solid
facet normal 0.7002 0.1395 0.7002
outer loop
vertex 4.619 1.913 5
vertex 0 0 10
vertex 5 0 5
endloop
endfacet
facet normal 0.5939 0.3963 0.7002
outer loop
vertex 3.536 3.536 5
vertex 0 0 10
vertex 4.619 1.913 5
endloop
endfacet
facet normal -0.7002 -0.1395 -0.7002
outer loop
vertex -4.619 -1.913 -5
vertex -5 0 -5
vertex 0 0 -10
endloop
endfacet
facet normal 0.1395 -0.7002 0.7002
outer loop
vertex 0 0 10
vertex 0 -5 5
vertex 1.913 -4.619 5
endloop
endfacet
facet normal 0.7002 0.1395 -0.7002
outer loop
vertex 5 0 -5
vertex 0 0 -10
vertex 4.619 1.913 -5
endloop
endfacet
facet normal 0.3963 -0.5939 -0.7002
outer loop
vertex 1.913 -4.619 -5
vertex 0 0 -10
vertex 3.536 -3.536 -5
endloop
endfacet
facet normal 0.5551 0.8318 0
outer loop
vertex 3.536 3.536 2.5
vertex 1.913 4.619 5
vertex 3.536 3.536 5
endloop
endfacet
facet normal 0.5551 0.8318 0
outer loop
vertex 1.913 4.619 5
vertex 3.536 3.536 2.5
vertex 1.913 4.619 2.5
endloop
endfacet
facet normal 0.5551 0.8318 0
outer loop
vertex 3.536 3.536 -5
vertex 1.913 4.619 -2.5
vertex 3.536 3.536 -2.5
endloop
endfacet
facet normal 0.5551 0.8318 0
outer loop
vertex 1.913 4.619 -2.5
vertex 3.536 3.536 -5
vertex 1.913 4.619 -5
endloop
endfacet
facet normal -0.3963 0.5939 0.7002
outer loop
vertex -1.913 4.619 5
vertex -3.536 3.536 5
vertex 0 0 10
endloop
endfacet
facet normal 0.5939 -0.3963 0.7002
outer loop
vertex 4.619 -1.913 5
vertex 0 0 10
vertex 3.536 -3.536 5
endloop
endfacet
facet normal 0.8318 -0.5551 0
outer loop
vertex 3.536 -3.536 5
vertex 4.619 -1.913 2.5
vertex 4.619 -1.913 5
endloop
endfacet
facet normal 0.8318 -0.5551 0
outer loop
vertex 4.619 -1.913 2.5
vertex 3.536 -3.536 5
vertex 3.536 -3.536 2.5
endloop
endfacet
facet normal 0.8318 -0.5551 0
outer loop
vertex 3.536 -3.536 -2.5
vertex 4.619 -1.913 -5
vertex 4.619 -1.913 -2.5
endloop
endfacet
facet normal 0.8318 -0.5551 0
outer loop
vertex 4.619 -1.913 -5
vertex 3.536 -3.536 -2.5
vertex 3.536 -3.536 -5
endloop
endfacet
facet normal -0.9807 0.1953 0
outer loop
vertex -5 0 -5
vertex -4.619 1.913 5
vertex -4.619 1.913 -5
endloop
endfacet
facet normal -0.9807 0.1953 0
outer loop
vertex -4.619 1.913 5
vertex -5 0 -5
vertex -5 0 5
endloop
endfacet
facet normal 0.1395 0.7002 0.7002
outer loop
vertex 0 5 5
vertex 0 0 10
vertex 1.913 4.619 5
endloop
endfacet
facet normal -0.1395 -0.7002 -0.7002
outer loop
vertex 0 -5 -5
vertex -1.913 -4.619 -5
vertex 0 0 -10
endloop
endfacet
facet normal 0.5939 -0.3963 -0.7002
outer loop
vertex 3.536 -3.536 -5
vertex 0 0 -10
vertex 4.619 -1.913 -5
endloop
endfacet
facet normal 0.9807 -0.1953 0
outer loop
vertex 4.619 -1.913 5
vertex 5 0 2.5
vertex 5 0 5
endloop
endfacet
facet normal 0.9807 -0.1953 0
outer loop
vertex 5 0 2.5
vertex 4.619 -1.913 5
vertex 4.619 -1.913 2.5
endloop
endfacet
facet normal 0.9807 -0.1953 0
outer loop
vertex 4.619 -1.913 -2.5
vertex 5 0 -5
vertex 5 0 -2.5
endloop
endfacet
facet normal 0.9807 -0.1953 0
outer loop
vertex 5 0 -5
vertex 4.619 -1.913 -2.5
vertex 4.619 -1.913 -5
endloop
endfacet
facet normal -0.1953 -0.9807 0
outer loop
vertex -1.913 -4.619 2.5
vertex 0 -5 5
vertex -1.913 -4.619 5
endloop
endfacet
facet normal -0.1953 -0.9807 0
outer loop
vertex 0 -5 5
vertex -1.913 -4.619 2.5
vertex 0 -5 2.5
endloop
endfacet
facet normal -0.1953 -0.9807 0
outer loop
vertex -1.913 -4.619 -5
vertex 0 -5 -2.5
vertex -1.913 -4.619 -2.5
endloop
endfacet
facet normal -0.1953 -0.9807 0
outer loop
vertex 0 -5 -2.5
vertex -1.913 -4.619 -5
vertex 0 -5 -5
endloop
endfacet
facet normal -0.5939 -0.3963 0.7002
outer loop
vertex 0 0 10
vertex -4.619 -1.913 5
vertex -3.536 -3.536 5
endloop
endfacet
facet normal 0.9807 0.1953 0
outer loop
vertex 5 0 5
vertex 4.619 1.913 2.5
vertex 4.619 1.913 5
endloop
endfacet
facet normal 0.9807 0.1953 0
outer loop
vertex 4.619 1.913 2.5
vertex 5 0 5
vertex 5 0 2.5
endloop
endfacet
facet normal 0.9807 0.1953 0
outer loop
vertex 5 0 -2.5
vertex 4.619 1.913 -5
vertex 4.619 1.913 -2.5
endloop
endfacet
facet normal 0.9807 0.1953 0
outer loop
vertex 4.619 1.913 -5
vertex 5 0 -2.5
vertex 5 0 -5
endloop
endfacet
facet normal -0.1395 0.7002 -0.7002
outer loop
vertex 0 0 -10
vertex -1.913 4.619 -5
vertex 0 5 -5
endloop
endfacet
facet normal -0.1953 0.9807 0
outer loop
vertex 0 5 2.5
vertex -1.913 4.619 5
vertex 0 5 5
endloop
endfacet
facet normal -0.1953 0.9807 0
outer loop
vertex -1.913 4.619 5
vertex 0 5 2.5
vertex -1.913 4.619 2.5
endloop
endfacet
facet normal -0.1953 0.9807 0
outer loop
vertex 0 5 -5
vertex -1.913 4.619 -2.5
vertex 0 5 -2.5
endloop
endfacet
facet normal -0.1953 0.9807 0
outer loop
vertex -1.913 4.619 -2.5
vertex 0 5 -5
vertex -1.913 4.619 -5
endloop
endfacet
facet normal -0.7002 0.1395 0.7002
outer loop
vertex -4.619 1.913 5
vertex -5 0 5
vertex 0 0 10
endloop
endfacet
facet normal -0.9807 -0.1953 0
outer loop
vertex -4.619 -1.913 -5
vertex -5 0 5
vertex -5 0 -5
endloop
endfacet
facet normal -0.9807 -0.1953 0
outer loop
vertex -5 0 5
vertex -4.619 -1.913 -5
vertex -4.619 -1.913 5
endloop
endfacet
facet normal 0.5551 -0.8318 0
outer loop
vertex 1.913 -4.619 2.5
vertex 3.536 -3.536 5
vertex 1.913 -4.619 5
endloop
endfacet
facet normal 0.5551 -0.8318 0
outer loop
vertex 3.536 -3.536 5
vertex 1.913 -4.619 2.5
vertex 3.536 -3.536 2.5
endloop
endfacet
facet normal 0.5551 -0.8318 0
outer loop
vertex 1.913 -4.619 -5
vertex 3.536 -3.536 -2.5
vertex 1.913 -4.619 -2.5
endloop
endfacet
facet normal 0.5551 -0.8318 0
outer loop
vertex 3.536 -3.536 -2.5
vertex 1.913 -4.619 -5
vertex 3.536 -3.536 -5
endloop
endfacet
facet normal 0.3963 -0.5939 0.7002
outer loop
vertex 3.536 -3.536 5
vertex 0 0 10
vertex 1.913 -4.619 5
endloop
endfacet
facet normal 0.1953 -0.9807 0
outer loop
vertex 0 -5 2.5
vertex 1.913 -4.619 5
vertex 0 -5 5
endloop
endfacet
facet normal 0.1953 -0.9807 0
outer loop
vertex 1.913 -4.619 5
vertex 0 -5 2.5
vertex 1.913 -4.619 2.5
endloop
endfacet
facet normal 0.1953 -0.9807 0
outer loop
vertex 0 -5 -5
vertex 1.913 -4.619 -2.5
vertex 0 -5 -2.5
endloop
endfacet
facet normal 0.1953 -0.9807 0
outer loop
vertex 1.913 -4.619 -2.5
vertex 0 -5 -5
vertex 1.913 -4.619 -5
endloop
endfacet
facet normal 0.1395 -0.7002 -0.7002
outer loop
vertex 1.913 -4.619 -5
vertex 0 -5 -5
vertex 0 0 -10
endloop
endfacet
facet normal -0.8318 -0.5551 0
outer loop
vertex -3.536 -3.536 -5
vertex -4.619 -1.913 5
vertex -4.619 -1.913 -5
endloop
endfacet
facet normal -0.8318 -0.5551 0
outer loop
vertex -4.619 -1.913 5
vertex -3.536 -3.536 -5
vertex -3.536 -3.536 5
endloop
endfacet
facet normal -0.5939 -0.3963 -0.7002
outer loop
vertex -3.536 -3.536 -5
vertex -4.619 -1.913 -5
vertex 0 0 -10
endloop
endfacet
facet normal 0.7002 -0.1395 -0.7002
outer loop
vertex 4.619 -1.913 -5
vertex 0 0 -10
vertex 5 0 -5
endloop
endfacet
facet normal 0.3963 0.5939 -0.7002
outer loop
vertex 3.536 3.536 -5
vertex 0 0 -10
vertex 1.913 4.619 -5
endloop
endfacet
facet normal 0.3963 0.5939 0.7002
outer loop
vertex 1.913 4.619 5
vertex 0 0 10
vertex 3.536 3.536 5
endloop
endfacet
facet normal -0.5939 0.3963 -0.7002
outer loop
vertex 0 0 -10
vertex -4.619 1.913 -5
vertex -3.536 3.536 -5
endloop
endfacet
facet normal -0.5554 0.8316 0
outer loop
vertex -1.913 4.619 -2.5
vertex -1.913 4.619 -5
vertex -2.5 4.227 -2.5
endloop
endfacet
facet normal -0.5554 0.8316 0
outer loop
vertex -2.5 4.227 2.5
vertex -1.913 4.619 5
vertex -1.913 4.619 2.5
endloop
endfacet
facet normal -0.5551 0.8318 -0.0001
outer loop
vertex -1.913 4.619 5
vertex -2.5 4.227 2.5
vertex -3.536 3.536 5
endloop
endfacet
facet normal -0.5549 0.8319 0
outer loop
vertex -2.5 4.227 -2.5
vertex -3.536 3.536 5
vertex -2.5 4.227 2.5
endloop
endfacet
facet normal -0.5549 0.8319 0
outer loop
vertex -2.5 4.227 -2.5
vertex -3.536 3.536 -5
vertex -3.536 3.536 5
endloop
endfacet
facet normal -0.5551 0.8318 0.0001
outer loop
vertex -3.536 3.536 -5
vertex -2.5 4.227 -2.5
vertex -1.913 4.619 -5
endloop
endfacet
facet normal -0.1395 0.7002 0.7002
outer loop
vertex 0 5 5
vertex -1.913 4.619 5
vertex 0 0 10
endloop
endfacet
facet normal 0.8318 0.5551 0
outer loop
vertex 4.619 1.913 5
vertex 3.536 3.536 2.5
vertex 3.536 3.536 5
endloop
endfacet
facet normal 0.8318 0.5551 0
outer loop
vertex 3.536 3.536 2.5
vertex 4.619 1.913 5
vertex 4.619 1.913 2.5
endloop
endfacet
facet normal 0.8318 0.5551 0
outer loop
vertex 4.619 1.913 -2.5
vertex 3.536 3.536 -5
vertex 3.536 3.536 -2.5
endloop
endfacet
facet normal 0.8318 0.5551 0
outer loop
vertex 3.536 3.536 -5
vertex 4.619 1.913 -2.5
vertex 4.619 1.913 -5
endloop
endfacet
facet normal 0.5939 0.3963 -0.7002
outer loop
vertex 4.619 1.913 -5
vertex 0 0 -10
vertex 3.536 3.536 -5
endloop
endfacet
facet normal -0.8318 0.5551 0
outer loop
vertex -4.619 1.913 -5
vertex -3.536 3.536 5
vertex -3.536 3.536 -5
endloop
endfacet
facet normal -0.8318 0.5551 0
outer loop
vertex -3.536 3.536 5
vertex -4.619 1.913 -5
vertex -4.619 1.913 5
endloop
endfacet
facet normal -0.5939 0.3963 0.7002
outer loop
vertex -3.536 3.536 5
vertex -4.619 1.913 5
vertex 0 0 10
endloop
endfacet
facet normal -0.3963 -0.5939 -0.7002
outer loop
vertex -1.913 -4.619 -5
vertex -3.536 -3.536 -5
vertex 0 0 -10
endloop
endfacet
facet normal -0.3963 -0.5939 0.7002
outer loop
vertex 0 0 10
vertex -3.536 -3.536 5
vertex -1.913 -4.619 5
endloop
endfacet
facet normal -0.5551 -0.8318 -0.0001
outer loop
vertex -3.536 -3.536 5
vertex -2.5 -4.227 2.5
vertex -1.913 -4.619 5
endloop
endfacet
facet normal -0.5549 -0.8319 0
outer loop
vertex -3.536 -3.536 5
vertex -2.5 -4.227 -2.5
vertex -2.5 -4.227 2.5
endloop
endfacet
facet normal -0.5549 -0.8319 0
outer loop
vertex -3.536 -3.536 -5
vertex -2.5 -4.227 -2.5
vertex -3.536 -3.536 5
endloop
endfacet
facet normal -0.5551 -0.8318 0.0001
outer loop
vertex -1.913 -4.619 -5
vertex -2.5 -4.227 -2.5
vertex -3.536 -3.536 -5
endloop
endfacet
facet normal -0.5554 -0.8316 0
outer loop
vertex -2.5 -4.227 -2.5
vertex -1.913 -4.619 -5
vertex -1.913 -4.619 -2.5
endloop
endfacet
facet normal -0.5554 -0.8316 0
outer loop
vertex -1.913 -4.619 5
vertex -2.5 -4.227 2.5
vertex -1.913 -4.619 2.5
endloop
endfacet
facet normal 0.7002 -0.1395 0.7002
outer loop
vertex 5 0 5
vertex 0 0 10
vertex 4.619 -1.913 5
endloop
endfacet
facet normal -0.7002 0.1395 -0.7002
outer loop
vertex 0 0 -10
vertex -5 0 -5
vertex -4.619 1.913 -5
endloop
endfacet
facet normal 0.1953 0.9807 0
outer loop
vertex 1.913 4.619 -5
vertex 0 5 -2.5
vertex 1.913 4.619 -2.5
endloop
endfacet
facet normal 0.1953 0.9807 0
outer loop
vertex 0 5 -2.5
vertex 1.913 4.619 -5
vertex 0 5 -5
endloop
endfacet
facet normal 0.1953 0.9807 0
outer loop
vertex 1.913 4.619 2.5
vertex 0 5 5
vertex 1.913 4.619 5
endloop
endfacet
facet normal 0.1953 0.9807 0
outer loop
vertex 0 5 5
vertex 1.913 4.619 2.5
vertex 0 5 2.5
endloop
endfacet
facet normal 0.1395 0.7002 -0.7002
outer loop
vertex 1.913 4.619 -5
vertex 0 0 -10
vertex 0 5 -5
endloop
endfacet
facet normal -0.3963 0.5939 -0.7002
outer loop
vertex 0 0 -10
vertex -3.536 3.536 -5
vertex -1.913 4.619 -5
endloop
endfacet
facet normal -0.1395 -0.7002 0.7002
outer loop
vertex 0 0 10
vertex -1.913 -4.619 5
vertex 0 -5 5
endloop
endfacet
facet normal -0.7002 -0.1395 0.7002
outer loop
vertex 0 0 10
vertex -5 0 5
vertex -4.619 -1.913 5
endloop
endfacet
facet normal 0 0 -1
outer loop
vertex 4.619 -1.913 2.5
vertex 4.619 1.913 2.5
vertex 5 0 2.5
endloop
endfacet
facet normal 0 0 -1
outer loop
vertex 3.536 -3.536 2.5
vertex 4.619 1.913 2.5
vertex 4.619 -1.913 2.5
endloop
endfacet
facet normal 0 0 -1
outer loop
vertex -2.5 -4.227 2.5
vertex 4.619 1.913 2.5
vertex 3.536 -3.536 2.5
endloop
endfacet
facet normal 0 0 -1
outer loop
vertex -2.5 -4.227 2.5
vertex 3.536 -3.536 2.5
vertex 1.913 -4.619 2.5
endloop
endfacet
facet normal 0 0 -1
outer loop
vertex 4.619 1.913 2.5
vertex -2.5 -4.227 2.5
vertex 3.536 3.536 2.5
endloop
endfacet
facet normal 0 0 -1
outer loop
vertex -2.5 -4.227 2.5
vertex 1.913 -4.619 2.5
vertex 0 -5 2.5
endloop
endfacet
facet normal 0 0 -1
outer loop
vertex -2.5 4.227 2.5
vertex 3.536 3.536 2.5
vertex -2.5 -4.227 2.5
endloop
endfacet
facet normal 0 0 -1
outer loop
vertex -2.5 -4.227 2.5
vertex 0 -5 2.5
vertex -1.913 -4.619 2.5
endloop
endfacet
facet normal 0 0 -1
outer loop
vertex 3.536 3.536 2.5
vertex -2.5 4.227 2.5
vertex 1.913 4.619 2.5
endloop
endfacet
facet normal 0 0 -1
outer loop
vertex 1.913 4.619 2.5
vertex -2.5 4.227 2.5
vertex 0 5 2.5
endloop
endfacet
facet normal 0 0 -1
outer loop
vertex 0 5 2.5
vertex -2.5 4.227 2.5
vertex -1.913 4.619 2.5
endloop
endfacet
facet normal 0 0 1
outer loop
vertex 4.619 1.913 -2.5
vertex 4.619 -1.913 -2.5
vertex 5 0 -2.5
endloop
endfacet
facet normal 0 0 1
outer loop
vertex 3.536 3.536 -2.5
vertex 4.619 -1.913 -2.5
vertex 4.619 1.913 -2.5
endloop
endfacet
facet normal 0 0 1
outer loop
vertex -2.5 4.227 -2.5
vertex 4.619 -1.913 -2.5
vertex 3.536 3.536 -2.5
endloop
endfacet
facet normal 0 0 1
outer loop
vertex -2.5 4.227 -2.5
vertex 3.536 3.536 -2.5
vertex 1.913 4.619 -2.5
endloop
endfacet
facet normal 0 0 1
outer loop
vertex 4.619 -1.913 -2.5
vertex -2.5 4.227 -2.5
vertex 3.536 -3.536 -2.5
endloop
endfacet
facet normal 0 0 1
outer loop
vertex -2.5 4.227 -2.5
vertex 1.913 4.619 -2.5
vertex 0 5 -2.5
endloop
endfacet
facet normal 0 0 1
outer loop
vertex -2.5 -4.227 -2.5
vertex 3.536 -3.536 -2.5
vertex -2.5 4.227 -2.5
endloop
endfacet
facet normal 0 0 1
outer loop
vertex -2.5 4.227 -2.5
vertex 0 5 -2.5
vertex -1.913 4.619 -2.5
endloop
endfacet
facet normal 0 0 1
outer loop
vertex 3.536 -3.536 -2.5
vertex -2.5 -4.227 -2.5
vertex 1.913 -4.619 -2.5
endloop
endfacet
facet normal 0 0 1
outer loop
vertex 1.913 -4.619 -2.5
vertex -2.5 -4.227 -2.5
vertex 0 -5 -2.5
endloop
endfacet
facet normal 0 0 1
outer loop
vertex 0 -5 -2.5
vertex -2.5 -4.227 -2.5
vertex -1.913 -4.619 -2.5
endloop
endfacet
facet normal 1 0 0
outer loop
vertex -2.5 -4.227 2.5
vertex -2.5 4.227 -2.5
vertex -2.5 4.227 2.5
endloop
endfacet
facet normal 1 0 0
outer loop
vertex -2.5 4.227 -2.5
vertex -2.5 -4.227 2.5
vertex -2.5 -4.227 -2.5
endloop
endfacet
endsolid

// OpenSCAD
jointLength = 10;
jointRadius = 5;
coneLength = 5;
jointHoleLength = 5;
jointConnectionThickness = jointRadius * 0.5;
resolution = 16;

difference() {

    hull() {

        translate(v = [ 0, 0, jointLength * 0.5 ])
            cylinder(h = coneLength, r1 = jointRadius, r2 = 0, center=false);

        translate(v = [ 0, 0, -jointLength * 0.5 ])
            rotate(a = [ 180, 0, 0 ])
                cylinder(h = coneLength, r1 = jointRadius, r2 = 0, center=false);

    };

    translate(v = [ jointConnectionThickness, 0, 0 ])
        cube(size = [ jointRadius * 2, jointHoleLength * 2, jointHoleLength ], center=true);

};
